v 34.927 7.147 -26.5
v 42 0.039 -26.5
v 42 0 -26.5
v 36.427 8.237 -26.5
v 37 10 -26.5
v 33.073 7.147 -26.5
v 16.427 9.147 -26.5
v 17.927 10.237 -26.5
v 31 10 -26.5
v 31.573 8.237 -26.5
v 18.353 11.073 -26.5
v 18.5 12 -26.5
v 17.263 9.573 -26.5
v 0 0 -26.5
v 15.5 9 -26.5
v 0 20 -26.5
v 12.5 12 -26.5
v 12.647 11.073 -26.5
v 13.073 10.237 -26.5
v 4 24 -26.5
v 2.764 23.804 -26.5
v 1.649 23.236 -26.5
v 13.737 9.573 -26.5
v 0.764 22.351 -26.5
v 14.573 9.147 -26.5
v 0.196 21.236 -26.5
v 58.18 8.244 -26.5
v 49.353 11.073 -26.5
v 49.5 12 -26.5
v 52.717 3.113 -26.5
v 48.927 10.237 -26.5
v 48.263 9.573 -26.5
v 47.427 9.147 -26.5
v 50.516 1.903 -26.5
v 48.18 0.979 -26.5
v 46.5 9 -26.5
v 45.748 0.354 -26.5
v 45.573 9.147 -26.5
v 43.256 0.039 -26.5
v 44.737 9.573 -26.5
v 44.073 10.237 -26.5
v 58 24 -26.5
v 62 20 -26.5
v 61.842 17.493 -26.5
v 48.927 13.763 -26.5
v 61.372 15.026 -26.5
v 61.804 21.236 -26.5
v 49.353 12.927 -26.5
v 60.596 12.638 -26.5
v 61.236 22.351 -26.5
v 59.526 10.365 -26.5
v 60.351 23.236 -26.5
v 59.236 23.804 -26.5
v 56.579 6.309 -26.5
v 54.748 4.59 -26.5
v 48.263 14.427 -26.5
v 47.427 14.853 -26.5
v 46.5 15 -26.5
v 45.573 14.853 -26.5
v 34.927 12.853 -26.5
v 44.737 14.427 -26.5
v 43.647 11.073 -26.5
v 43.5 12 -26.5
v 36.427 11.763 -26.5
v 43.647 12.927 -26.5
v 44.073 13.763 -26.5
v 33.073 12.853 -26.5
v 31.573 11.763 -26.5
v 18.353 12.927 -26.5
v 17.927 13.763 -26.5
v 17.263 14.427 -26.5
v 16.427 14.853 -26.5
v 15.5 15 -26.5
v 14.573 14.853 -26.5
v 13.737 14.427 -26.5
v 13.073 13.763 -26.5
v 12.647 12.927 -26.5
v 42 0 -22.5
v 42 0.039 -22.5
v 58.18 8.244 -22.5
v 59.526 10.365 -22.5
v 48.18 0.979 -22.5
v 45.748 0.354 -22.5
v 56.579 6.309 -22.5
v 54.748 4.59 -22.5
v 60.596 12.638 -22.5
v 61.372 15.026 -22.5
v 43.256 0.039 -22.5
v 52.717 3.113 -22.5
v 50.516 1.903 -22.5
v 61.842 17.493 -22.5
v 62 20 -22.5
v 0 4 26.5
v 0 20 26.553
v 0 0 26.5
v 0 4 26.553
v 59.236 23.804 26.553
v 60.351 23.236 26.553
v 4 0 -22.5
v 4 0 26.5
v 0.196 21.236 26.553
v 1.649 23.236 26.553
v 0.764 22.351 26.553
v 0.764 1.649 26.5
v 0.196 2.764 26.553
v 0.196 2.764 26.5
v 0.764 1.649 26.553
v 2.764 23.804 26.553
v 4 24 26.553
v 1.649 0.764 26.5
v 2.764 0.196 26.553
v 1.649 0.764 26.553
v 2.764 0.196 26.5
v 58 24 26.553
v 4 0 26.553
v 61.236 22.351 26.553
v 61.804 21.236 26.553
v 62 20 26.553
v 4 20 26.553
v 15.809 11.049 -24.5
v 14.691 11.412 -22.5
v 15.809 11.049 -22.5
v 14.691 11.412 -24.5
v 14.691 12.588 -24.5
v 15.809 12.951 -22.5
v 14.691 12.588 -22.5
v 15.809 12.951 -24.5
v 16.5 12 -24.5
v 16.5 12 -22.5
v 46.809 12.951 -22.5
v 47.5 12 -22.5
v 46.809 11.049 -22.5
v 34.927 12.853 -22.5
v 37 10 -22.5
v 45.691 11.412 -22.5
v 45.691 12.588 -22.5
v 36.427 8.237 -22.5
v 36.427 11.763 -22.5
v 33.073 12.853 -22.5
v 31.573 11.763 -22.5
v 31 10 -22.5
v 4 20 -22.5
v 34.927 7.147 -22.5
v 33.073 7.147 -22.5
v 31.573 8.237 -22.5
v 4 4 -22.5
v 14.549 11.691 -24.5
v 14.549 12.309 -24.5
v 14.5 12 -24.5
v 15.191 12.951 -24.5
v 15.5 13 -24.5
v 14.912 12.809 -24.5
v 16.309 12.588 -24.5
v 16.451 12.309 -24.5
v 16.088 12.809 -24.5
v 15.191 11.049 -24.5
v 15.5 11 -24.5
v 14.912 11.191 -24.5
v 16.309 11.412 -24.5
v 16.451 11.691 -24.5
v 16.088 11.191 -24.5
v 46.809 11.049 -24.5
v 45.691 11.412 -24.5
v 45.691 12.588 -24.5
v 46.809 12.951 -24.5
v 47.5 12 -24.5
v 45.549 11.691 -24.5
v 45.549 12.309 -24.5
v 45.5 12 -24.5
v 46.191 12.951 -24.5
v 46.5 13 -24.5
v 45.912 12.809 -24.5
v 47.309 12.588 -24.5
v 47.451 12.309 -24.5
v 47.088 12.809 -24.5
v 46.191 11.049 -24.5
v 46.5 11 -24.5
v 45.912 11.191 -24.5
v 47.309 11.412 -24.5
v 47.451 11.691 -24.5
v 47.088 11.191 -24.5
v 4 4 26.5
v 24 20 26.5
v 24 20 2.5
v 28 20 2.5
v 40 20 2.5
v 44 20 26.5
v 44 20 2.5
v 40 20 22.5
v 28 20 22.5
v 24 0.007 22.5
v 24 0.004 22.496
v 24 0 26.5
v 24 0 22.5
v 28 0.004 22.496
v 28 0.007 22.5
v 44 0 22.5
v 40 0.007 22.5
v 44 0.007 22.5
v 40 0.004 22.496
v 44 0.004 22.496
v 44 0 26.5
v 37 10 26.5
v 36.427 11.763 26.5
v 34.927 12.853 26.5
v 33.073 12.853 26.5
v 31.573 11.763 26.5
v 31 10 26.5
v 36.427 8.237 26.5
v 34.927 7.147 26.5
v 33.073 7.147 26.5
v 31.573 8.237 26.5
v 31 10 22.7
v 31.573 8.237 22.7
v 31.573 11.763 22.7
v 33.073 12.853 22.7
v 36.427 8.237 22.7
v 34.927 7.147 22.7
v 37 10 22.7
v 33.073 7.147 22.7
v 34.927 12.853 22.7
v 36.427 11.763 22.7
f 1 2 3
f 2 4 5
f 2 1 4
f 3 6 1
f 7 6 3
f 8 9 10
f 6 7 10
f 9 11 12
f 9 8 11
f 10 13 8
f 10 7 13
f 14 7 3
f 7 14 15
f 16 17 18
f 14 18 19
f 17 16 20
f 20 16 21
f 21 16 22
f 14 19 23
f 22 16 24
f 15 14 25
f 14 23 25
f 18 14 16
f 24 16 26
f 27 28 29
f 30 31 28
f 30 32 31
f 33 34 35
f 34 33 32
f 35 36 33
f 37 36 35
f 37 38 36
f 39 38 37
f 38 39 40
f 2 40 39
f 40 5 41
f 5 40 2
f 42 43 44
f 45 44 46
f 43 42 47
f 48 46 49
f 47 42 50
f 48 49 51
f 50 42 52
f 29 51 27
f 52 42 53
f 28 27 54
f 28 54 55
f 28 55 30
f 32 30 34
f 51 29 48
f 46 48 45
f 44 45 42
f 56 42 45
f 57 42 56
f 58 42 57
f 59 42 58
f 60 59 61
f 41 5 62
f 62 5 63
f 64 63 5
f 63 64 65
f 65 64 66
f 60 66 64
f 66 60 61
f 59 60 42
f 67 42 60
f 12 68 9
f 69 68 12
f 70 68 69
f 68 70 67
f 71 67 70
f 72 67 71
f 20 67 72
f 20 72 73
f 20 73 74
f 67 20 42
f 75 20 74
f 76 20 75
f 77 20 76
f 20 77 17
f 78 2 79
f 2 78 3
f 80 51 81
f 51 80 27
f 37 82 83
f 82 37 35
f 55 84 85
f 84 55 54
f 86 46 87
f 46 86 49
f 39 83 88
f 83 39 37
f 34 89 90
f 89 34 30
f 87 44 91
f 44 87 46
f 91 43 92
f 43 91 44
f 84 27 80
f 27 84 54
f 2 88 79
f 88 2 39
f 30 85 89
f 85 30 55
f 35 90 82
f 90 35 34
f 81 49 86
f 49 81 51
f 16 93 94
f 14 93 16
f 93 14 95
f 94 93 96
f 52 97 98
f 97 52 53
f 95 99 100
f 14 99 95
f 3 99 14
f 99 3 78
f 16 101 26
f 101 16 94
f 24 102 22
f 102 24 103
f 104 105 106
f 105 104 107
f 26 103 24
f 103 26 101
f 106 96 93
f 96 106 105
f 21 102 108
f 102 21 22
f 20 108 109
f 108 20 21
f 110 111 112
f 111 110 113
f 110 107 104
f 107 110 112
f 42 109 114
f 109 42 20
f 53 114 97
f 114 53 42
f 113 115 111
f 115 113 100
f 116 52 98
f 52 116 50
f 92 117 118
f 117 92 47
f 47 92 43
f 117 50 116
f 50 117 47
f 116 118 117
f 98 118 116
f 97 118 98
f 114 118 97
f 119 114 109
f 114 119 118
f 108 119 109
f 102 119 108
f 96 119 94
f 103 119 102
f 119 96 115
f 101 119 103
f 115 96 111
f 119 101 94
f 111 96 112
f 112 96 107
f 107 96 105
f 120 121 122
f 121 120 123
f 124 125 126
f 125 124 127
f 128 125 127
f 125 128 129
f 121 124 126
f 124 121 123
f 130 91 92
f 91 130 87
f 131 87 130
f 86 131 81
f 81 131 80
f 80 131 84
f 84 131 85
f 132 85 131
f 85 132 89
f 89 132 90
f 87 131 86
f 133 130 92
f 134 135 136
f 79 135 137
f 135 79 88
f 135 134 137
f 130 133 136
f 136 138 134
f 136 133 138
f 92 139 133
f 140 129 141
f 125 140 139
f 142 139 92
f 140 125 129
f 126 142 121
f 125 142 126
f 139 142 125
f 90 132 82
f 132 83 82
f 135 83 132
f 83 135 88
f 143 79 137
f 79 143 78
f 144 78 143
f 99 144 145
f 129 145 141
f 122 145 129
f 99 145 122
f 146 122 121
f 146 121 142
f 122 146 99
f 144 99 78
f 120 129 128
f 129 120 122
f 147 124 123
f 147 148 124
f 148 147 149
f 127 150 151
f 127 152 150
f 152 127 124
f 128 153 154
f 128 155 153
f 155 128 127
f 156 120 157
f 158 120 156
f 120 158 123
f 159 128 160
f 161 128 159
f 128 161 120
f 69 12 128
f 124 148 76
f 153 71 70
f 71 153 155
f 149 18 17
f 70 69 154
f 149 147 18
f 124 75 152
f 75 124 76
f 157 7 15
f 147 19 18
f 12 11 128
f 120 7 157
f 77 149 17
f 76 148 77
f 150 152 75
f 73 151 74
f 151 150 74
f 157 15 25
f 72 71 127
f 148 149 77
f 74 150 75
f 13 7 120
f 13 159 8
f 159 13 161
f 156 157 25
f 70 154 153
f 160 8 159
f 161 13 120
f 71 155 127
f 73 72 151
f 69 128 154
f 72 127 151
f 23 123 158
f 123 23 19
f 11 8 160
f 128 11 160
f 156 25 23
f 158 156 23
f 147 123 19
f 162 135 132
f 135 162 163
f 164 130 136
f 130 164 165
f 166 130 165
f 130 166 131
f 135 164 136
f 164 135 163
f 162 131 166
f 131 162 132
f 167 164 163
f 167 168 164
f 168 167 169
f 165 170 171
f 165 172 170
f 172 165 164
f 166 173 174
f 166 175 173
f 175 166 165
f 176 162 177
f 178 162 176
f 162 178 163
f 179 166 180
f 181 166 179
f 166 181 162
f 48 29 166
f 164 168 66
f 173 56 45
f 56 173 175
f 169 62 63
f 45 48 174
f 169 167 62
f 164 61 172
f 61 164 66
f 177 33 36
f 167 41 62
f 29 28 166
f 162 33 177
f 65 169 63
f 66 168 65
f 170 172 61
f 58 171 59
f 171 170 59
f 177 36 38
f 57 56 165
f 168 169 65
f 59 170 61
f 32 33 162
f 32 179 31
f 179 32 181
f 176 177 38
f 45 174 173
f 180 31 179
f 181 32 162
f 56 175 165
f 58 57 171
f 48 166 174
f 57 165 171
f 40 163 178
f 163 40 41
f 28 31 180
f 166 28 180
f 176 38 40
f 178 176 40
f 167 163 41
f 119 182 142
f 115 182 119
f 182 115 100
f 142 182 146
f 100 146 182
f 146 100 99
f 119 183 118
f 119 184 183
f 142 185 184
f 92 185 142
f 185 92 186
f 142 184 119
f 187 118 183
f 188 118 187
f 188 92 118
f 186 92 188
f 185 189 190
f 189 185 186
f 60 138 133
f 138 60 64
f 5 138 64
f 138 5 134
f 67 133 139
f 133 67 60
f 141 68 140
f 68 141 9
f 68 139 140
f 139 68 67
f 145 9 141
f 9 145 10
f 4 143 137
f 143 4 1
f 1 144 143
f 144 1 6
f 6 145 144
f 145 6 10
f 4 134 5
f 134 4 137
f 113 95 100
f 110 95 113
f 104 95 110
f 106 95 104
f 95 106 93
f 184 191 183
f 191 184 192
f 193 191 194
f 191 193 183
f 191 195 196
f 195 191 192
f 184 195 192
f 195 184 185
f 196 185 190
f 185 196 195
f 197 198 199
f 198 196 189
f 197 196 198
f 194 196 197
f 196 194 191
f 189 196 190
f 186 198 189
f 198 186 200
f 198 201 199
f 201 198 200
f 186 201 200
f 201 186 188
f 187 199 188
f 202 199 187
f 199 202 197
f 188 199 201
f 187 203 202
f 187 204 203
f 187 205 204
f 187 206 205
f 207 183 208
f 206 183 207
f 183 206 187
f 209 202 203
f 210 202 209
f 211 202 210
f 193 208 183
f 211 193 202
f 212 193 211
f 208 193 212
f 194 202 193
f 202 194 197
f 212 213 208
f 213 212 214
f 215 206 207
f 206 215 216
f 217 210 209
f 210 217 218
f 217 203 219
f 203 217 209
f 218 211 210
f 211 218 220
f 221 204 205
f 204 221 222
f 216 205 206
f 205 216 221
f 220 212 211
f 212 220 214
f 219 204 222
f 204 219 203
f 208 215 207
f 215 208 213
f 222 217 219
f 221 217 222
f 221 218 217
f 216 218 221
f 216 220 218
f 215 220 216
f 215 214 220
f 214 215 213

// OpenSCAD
// copyright 2012 mark.dufour@gmail.com, license GPL v3

// configuration

BOARD_THICKNESS=8;
VERTICAL_GAP=45;
FOOT_HEIGHT=4;
WOOD_SCREW_R=1;
LAYER_HEIGHT=0.2;

// internal

HEIGHT=FOOT_HEIGHT+BOARD_THICKNESS+VERTICAL_GAP-4; // existing lower vertices stick out by 4mm

LENGTH=62;
WIDTH=24;
CURVE_R=4;
CURVE_R2=20;
THICKNESS=4;
HOLE_R=3;
HOLE_X=34;
HOLE_Y=10;
SUPPORT_WIDTH=20;

module base_shape() {
    difference() {
        translate([CURVE_R, CURVE_R,-1/2])
            minkowski() {
                cylinder(1,r=4, $fn=20);
                cube([LENGTH-2*CURVE_R,WIDTH-2*CURVE_R,0.001]);
            }

        translate([LENGTH-CURVE_R2,CURVE_R2,-1/2])
            difference() {
                translate([0,-100,0])
                    cube([100,100,2]);
                cylinder(2,r=CURVE_R2, $fn=50);
            }
    }
}

module screw() {
    translate([0,0,2])
        cylinder(THICKNESS-2,r=WOOD_SCREW_R);
    cylinder(2,r2=WOOD_SCREW_R,r1=WOOD_SCREW_R+2,$fn=20);
}

module base() {
    translate([0,0,-HEIGHT/2])
        cube([THICKNESS,THICKNESS,HEIGHT]);
    difference() {
        scale([1,1,HEIGHT])
            base_shape();
        translate([THICKNESS,-THICKNESS,-HEIGHT/2+THICKNESS])
            cube([LENGTH,WIDTH,HEIGHT]);
        translate([LENGTH/4,WIDTH/2,-HEIGHT/2])
            screw();
        translate([3*LENGTH/4,WIDTH/2,-HEIGHT/2])
            screw();
        translate([HOLE_X,HOLE_Y,-HEIGHT/2-1])
            cylinder(THICKNESS+2,r=HOLE_R);
    }
}

module support() {
    mirror([0,1,0])
        difference() {
            union() {
                cube([SUPPORT_WIDTH,WIDTH,THICKNESS]);
                support_45();
                translate([SUPPORT_WIDTH-THICKNESS,0,0])
                    support_45();
            }
            translate([SUPPORT_WIDTH/2,WIDTH-HOLE_Y,0])
                cylinder(2*THICKNESS,r=HOLE_R);
        }
    translate([SUPPORT_WIDTH/2-HOLE_R,-(WIDTH-HOLE_Y+HOLE_R),0])
        cube([2*HOLE_R,2*HOLE_R,LAYER_HEIGHT]);
}

module support_45() {
    mirror([0,1,0])
    translate([0,-WIDTH,-WIDTH])
        intersection() {
            translate([0,WIDTH,0])
            rotate([45,0,0])
                cube([THICKNESS,WIDTH*1.414,WIDTH*1.414]);
            cube([THICKNESS,WIDTH,WIDTH]);
        }
}

module foot() {
    base();
    translate([HOLE_X-SUPPORT_WIDTH/2,WIDTH,HEIGHT/2-THICKNESS])
        support();
}

mirror([0,0,0])
    foot();
